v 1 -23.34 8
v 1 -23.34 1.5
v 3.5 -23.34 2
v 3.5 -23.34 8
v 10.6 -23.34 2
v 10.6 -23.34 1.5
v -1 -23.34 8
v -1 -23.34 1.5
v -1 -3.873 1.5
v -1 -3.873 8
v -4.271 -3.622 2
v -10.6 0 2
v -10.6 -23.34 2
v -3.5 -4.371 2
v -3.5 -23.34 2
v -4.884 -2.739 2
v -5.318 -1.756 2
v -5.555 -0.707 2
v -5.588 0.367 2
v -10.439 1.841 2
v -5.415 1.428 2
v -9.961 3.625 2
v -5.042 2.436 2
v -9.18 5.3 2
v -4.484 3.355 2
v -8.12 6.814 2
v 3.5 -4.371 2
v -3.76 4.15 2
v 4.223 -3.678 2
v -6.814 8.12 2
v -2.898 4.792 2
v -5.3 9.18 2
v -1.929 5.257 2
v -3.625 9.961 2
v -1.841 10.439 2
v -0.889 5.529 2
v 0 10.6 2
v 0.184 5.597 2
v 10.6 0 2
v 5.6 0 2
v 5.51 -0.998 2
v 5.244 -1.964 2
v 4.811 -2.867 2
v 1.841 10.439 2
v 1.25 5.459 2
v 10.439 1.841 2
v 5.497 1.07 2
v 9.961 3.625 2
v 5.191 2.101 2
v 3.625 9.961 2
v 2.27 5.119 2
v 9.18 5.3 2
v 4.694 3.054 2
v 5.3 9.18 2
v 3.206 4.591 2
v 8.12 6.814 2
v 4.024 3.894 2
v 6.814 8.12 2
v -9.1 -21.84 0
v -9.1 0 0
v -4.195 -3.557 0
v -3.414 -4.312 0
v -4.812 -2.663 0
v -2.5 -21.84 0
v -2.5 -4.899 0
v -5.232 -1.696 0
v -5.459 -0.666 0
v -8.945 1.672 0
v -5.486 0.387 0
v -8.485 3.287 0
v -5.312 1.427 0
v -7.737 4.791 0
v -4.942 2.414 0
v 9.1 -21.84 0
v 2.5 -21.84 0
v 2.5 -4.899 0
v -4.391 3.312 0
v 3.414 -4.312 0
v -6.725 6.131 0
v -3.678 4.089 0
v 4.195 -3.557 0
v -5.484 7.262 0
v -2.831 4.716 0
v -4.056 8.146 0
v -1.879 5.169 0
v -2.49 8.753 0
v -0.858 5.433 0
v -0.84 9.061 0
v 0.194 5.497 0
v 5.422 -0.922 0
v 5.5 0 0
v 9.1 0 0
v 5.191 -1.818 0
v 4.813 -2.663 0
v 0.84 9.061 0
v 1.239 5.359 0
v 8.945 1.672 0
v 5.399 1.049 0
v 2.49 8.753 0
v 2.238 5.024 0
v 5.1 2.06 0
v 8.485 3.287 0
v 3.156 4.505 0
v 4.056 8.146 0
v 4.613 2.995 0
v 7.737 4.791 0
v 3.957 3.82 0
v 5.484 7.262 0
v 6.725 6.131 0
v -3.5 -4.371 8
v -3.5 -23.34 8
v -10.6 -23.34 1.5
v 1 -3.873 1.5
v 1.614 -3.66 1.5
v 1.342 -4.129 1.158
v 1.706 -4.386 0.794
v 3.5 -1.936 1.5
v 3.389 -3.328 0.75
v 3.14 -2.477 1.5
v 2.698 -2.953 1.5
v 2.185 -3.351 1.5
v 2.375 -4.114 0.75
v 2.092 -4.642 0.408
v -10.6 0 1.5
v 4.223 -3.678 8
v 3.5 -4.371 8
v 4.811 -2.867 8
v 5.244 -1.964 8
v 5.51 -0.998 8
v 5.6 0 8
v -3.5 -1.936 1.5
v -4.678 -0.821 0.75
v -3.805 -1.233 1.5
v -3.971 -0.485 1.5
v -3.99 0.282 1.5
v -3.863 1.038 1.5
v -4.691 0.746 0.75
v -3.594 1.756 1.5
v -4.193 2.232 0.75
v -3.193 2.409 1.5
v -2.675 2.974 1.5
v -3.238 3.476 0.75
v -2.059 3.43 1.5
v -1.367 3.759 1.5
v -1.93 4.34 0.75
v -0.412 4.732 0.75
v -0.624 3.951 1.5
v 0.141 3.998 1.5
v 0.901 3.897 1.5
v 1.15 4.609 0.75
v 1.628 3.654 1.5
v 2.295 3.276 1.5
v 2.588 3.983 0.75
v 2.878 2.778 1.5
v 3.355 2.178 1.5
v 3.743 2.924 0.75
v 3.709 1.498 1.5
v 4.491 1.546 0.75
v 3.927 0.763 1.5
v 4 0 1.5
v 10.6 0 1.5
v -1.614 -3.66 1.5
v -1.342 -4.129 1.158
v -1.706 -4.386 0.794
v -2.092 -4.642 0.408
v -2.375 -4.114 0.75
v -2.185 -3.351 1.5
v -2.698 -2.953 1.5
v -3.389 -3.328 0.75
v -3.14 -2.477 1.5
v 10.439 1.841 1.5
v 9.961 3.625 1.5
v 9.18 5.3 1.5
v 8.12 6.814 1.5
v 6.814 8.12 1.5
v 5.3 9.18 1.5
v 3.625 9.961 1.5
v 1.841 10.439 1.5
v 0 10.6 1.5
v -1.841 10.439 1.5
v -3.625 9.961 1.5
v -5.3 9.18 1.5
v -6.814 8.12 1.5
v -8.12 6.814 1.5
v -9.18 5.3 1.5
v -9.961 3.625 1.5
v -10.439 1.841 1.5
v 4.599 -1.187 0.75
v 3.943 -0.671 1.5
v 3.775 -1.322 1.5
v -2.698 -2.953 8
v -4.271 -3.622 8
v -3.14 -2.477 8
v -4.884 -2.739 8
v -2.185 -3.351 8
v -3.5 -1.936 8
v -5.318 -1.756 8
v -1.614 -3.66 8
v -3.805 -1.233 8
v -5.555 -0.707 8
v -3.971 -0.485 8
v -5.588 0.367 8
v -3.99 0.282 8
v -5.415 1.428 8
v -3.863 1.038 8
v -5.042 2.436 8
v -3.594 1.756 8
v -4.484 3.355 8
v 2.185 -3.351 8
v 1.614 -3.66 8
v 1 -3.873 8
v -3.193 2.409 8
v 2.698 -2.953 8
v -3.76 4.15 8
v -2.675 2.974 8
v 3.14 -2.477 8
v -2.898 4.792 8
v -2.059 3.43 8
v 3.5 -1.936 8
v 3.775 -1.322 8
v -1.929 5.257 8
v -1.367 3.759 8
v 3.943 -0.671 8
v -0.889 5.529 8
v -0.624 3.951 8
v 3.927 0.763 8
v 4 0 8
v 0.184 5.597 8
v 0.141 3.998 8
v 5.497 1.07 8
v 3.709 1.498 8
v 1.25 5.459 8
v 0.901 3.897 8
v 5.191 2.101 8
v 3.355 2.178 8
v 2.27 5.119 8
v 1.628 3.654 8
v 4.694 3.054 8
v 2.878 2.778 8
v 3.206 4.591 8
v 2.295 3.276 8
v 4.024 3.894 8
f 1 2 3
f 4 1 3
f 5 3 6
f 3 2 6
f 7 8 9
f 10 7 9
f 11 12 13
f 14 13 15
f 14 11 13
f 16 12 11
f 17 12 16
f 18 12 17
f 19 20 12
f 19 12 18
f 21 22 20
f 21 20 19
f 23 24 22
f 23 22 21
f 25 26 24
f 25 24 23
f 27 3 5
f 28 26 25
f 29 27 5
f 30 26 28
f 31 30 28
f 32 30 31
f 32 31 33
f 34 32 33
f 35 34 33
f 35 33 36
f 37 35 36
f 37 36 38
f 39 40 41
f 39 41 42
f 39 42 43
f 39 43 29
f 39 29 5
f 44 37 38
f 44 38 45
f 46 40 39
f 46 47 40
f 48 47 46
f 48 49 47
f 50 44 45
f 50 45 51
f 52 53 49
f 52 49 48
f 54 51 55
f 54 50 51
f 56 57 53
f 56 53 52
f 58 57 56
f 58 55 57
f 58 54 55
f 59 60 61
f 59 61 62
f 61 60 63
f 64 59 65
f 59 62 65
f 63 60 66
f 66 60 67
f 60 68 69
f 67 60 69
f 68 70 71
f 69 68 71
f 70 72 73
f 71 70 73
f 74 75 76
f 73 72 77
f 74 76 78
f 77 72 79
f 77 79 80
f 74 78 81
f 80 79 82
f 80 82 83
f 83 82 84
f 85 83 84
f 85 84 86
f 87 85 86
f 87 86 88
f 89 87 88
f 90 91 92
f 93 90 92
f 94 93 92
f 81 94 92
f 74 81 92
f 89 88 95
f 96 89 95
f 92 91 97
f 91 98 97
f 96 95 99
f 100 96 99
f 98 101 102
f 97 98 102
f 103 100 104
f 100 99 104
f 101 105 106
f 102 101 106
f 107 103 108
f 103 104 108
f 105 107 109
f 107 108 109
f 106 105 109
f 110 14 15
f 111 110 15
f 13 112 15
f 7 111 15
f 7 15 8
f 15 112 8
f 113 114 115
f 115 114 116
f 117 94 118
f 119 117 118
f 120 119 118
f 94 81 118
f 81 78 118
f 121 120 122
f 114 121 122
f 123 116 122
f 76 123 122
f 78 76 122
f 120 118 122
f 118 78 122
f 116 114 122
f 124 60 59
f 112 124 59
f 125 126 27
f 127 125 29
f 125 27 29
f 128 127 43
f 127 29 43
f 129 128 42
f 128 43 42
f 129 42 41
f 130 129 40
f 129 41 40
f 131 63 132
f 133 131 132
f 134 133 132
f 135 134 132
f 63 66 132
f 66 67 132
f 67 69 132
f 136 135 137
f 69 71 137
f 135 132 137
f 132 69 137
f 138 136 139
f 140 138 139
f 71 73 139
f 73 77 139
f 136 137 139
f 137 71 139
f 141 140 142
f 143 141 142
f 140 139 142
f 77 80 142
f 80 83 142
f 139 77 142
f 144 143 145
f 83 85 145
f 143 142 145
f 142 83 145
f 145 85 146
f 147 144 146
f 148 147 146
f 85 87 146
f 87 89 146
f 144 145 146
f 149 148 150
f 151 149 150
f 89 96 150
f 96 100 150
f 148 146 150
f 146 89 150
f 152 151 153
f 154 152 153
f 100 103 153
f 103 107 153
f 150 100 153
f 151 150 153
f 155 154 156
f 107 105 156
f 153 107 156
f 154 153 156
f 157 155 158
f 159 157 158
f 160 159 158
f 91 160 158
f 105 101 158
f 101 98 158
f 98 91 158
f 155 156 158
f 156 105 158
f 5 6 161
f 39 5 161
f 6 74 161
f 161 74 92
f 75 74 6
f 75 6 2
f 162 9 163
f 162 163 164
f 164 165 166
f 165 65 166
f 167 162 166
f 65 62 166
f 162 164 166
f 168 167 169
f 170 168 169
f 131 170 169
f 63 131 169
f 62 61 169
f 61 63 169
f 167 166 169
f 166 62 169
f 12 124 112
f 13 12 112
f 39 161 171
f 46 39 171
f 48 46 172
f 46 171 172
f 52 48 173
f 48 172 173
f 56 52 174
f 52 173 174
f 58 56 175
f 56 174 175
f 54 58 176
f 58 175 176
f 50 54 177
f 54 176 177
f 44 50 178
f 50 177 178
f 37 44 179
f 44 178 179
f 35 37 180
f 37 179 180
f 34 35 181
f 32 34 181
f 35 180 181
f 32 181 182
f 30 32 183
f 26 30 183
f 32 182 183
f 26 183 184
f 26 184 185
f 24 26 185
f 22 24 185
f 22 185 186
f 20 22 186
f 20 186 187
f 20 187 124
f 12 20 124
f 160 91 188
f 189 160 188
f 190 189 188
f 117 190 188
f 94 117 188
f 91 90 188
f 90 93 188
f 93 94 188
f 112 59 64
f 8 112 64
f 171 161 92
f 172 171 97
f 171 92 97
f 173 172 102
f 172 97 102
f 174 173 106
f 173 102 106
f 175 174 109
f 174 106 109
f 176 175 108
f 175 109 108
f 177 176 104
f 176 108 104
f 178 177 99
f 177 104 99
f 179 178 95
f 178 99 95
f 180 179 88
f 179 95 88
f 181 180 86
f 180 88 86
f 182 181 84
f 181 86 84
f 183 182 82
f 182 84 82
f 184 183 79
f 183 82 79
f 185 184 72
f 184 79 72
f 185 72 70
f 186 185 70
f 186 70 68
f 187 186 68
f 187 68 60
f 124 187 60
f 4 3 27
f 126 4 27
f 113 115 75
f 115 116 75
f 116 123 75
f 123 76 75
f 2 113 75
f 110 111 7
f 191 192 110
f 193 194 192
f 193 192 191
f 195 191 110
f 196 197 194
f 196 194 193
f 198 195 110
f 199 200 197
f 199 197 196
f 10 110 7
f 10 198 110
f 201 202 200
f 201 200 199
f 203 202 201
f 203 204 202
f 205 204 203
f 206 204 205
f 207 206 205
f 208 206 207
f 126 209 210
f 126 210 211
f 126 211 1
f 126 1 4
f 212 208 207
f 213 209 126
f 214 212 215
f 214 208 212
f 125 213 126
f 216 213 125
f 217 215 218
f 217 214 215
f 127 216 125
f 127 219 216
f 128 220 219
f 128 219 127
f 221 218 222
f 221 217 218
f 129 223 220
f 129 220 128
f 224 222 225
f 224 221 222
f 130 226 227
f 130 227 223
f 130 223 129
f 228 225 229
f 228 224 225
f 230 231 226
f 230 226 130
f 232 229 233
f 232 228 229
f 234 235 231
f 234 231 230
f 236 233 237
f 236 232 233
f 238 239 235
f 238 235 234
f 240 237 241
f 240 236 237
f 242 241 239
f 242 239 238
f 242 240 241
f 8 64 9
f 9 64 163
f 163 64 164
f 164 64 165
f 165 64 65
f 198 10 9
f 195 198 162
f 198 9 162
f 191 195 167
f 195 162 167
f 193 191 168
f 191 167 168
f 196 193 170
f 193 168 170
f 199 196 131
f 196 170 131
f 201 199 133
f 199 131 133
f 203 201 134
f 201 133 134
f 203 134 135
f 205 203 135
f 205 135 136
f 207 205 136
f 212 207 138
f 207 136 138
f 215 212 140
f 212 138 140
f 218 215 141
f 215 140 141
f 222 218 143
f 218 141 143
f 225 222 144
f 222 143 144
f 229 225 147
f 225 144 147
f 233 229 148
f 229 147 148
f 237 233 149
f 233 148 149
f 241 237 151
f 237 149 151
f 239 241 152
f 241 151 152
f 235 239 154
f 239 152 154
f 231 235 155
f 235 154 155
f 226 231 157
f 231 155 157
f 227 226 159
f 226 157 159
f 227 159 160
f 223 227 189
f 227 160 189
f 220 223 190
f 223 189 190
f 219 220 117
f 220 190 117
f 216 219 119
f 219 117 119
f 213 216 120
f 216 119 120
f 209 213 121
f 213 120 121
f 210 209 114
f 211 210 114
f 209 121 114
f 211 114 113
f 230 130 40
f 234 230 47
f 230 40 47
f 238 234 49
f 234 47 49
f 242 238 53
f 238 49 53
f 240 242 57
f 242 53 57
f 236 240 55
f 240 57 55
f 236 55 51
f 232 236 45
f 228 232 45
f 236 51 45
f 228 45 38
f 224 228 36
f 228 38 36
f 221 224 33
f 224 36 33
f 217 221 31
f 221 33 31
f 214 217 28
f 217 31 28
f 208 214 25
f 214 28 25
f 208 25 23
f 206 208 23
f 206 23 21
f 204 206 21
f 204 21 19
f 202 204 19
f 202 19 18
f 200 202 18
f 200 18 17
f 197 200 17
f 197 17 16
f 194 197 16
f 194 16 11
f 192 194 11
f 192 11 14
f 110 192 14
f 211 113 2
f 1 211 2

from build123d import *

# Parameters (mm, degrees)
F1_DEPTH = 2
F2_DEPTH = 8
F3_SIZE  = 1.5


with BuildPart() as f1:
    # F0 (on Top) → F1 (new body)
    with BuildSketch(Plane.XY):
        with BuildLine():
            Line((-3.5, -23.3402318112), (-3.5, -10.0054984883))
            ThreePointArc((-3.5, -10.0054984883), (-8.6446515257, -6.1343296292), (-10.6, 0))
            Line((-10.6, 0), (-10.6, -23.3402318112))
            Line((-10.6, -23.3402318112), (-3.5, -23.3402318112))
        make_face()
        with BuildLine():
            ThreePointArc((10.6, 0), (8.6446515257, -6.1343296292), (3.5, -10.0054984883))
            Line((3.5, -10.0054984883), (3.5, -23.3402318112))
            Line((3.5, -23.3402318112), (10.6, -23.3402318112))
            Line((10.6, -23.3402318112), (10.6, 0))
        make_face()
        with BuildLine():
            Line((3.5, -23.3402318112), (3.5, -10.0054984883))
            ThreePointArc((3.5, -10.0054984883), (2.2665754234, -10.3548363507), (1, -10.5527247666))
            Line((1, -10.5527247666), (1, -23.3402318112))
            Line((1, -23.3402318112), (3.5, -23.3402318112))
        make_face()
        with BuildLine():
            ThreePointArc((-1, -10.5527247666), (-2.2665754234, -10.3548363507), (-3.5, -10.0054984883))
            Line((-3.5, -10.0054984883), (-3.5, -23.3402318112))
            Line((-3.5, -23.3402318112), (-1, -23.3402318112))
            Line((-1, -23.3402318112), (-1, -10.5527247666))
        make_face()
        with BuildLine():
            ThreePointArc((-1, -5.5099909256), (-2.3208923272, -5.0964162708), (-3.5, -4.3714985989))
            Line((-3.5, -4.3714985989), (-3.5, -10.0054984883))
            ThreePointArc((-3.5, -10.0054984883), (-2.2665754234, -10.3548363507), (-1, -10.5527247666))
            Line((-1, -10.5527247666), (-1, -5.5099909256))
        make_face()
        with BuildLine():
            Line((-3.5, -10.0054984883), (-3.5, -4.3714985989))
            ThreePointArc((-3.5, -4.3714985989), (-2.4248711306, 5.0477717856), (5.6, 0))
            ThreePointArc((5.6, 0), (5.0477717856, -2.4248711306), (3.5, -4.3714985989))
            Line((3.5, -4.3714985989), (3.5, -10.0054984883))
            ThreePointArc((3.5, -10.0054984883), (8.6446515257, -6.1343296292), (10.6, 0))
            ThreePointArc((10.6, 0), (0, 10.6), (-10.6, 0))
            ThreePointArc((-10.6, 0), (-8.6446515257, -6.1343296292), (-3.5, -10.0054984883))
        make_face()
        with BuildLine():
            ThreePointArc((-3.5, -1.9364916731), (-1, 3.8729833462), (4, 0))
            ThreePointArc((4, 0), (3.8729833462, -1), (3.5, -1.9364916731))
            Line((3.5, -1.9364916731), (3.5, -4.3714985989))
            ThreePointArc((3.5, -4.3714985989), (5.0477717856, -2.4248711306), (5.6, 0))
            ThreePointArc((5.6, 0), (-2.4248711306, 5.0477717856), (-3.5, -4.3714985989))
            Line((-3.5, -4.3714985989), (-3.5, -1.9364916731))
        make_face()
        with BuildLine():
            Line((3.5, -10.0054984883), (3.5, -4.3714985989))
            ThreePointArc((3.5, -4.3714985989), (2.3208923272, -5.0964162708), (1, -5.5099909256))
            Line((1, -5.5099909256), (1, -10.5527247666))
            ThreePointArc((1, -10.5527247666), (2.2665754234, -10.3548363507), (3.5, -10.0054984883))
        make_face()
        with BuildLine():
            Line((3.5, -4.3714985989), (3.5, -1.9364916731))
            ThreePointArc((3.5, -1.9364916731), (2.4494897428, -3.1622776602), (1, -3.8729833462))
            Line((1, -3.8729833462), (1, -5.5099909256))
            ThreePointArc((1, -5.5099909256), (2.3208923272, -5.0964162708), (3.5, -4.3714985989))
        make_face()
        with BuildLine():
            ThreePointArc((-1, -3.8729833462), (-2.4494897428, -3.1622776602), (-3.5, -1.9364916731))
            Line((-3.5, -1.9364916731), (-3.5, -4.3714985989))
            ThreePointArc((-3.5, -4.3714985989), (-2.3208923272, -5.0964162708), (-1, -5.5099909256))
            Line((-1, -5.5099909256), (-1, -3.8729833462))
        make_face()
    extrude(amount=F1_DEPTH)

    # F0 (on Top) → F2 (join)
    with BuildSketch(Plane.XY):
        with BuildLine():
            ThreePointArc((-3.5, -1.9364916731), (-1, 3.8729833462), (4, 0))
            ThreePointArc((4, 0), (3.8729833462, -1), (3.5, -1.9364916731))
            Line((3.5, -1.9364916731), (3.5, -4.3714985989))
            ThreePointArc((3.5, -4.3714985989), (5.0477717856, -2.4248711306), (5.6, 0))
            ThreePointArc((5.6, 0), (-2.4248711306, 5.0477717856), (-3.5, -4.3714985989))
            Line((-3.5, -4.3714985989), (-3.5, -1.9364916731))
        make_face()
        with BuildLine():
            ThreePointArc((-1, -5.5099909256), (-2.3208923272, -5.0964162708), (-3.5, -4.3714985989))
            Line((-3.5, -4.3714985989), (-3.5, -10.0054984883))
            ThreePointArc((-3.5, -10.0054984883), (-2.2665754234, -10.3548363507), (-1, -10.5527247666))
            Line((-1, -10.5527247666), (-1, -5.5099909256))
        make_face()
        with BuildLine():
            ThreePointArc((-1, -10.5527247666), (-2.2665754234, -10.3548363507), (-3.5, -10.0054984883))
            Line((-3.5, -10.0054984883), (-3.5, -23.3402318112))
            Line((-3.5, -23.3402318112), (-1, -23.3402318112))
            Line((-1, -23.3402318112), (-1, -10.5527247666))
        make_face()
        with BuildLine():
            Line((3.5, -23.3402318112), (3.5, -10.0054984883))
            ThreePointArc((3.5, -10.0054984883), (2.2665754234, -10.3548363507), (1, -10.5527247666))
            Line((1, -10.5527247666), (1, -23.3402318112))
            Line((1, -23.3402318112), (3.5, -23.3402318112))
        make_face()
        with BuildLine():
            Line((3.5, -10.0054984883), (3.5, -4.3714985989))
            ThreePointArc((3.5, -4.3714985989), (2.3208923272, -5.0964162708), (1, -5.5099909256))
            Line((1, -5.5099909256), (1, -10.5527247666))
            ThreePointArc((1, -10.5527247666), (2.2665754234, -10.3548363507), (3.5, -10.0054984883))
        make_face()
        with BuildLine():
            Line((3.5, -4.3714985989), (3.5, -1.9364916731))
            ThreePointArc((3.5, -1.9364916731), (2.4494897428, -3.1622776602), (1, -3.8729833462))
            Line((1, -3.8729833462), (1, -5.5099909256))
            ThreePointArc((1, -5.5099909256), (2.3208923272, -5.0964162708), (3.5, -4.3714985989))
        make_face()
        with BuildLine():
            ThreePointArc((-1, -3.8729833462), (-2.4494897428, -3.1622776602), (-3.5, -1.9364916731))
            Line((-3.5, -1.9364916731), (-3.5, -4.3714985989))
            ThreePointArc((-3.5, -4.3714985989), (-2.3208923272, -5.0964162708), (-1, -5.5099909256))
            Line((-1, -5.5099909256), (-1, -3.8729833462))
        make_face()
    extrude(amount=F2_DEPTH)

    # F3
    f3_edges = [f1.edges().sort_by_distance(p)[0] for p in [
        (0, 10.6, 0),
        (-10.6, -11.670116, 0),
        (-5.8, -23.340232, 0),
        (-1, -13.606608, 0),
        (0, 4, 0),
        (1, -13.606608, 0),
        (5.8, -23.340232, 0),
        (10.6, -11.670116, 0),
    ]]
    chamfer(f3_edges, length=F3_SIZE)


solid = f1.part
